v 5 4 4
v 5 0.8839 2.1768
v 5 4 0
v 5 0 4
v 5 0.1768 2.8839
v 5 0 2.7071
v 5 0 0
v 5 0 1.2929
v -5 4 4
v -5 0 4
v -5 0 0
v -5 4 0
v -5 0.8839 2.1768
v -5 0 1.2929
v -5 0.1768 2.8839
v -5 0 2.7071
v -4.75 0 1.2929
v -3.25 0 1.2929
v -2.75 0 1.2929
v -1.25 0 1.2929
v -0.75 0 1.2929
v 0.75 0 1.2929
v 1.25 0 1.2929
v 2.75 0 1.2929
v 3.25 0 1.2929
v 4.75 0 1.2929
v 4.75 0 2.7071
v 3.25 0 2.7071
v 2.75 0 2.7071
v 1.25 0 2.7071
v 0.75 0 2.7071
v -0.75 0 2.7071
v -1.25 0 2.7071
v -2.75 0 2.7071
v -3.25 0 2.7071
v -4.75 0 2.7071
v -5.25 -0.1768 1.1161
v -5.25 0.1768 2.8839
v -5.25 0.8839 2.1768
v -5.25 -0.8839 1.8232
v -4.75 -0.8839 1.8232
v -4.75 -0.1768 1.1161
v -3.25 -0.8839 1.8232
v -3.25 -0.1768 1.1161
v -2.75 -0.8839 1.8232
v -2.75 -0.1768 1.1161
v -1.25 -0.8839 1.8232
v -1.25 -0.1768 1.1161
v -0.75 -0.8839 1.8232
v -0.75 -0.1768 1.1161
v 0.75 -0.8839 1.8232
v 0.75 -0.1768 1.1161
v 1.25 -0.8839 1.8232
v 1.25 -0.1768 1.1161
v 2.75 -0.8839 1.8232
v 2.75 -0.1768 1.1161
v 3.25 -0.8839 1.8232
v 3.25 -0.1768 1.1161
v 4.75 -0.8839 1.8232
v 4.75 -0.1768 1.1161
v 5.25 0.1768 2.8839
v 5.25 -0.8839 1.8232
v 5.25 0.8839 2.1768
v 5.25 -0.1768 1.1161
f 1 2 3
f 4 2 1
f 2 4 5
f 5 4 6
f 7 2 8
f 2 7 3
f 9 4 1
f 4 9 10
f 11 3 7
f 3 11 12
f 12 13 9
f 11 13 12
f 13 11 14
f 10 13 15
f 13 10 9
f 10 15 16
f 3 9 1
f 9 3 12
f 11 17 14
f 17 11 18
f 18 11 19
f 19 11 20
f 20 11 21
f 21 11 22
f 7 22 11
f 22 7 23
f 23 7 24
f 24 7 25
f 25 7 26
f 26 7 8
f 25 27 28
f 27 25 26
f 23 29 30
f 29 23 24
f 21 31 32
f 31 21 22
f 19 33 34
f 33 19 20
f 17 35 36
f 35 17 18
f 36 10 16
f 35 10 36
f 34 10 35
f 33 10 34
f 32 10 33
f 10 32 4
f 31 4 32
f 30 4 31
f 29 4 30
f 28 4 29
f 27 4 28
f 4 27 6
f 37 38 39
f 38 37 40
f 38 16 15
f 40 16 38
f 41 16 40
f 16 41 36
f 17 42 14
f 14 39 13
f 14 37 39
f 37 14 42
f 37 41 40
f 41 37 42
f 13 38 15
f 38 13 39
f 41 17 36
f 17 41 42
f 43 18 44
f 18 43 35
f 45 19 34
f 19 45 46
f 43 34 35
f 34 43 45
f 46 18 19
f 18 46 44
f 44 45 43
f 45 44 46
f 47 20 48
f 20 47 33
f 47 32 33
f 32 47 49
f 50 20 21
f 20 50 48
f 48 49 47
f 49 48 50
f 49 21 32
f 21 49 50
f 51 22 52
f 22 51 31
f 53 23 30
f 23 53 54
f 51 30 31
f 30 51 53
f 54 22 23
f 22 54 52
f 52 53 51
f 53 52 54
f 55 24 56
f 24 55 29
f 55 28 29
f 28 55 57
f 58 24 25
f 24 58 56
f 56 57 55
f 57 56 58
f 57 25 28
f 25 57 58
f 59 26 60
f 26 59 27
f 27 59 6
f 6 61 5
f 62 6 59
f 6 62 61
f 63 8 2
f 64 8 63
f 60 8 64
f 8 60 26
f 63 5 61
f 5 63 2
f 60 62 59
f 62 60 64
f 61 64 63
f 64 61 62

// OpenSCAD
// Variables for easy tweaking
width = 10;
height = 4;
curve_depth = 2;
tooth_count = 6;

difference() {
    // Main curved blade (Intersection of a cube and a cylinder)
    intersection() {
        translate([-width/2, 0, 0])
            cube([width, height, curve_depth * 2]);

        translate([0, height/2, curve_depth])
            rotate([0, 90, 0])
            cylinder(h=width + 2, r=height * 1.5, center=true, $fn=60);
    }

    // Cut out "wear" or details here
}

// Add Teeth
for (i = [0 : tooth_count-1]) {
    x_pos = -width/2 + (width / (tooth_count-1)) * i;
    translate([x_pos, 0, curve_depth])
        rotate([45, 0, 0])
        cube([0.5, 1.5, 1], center=true);
}
